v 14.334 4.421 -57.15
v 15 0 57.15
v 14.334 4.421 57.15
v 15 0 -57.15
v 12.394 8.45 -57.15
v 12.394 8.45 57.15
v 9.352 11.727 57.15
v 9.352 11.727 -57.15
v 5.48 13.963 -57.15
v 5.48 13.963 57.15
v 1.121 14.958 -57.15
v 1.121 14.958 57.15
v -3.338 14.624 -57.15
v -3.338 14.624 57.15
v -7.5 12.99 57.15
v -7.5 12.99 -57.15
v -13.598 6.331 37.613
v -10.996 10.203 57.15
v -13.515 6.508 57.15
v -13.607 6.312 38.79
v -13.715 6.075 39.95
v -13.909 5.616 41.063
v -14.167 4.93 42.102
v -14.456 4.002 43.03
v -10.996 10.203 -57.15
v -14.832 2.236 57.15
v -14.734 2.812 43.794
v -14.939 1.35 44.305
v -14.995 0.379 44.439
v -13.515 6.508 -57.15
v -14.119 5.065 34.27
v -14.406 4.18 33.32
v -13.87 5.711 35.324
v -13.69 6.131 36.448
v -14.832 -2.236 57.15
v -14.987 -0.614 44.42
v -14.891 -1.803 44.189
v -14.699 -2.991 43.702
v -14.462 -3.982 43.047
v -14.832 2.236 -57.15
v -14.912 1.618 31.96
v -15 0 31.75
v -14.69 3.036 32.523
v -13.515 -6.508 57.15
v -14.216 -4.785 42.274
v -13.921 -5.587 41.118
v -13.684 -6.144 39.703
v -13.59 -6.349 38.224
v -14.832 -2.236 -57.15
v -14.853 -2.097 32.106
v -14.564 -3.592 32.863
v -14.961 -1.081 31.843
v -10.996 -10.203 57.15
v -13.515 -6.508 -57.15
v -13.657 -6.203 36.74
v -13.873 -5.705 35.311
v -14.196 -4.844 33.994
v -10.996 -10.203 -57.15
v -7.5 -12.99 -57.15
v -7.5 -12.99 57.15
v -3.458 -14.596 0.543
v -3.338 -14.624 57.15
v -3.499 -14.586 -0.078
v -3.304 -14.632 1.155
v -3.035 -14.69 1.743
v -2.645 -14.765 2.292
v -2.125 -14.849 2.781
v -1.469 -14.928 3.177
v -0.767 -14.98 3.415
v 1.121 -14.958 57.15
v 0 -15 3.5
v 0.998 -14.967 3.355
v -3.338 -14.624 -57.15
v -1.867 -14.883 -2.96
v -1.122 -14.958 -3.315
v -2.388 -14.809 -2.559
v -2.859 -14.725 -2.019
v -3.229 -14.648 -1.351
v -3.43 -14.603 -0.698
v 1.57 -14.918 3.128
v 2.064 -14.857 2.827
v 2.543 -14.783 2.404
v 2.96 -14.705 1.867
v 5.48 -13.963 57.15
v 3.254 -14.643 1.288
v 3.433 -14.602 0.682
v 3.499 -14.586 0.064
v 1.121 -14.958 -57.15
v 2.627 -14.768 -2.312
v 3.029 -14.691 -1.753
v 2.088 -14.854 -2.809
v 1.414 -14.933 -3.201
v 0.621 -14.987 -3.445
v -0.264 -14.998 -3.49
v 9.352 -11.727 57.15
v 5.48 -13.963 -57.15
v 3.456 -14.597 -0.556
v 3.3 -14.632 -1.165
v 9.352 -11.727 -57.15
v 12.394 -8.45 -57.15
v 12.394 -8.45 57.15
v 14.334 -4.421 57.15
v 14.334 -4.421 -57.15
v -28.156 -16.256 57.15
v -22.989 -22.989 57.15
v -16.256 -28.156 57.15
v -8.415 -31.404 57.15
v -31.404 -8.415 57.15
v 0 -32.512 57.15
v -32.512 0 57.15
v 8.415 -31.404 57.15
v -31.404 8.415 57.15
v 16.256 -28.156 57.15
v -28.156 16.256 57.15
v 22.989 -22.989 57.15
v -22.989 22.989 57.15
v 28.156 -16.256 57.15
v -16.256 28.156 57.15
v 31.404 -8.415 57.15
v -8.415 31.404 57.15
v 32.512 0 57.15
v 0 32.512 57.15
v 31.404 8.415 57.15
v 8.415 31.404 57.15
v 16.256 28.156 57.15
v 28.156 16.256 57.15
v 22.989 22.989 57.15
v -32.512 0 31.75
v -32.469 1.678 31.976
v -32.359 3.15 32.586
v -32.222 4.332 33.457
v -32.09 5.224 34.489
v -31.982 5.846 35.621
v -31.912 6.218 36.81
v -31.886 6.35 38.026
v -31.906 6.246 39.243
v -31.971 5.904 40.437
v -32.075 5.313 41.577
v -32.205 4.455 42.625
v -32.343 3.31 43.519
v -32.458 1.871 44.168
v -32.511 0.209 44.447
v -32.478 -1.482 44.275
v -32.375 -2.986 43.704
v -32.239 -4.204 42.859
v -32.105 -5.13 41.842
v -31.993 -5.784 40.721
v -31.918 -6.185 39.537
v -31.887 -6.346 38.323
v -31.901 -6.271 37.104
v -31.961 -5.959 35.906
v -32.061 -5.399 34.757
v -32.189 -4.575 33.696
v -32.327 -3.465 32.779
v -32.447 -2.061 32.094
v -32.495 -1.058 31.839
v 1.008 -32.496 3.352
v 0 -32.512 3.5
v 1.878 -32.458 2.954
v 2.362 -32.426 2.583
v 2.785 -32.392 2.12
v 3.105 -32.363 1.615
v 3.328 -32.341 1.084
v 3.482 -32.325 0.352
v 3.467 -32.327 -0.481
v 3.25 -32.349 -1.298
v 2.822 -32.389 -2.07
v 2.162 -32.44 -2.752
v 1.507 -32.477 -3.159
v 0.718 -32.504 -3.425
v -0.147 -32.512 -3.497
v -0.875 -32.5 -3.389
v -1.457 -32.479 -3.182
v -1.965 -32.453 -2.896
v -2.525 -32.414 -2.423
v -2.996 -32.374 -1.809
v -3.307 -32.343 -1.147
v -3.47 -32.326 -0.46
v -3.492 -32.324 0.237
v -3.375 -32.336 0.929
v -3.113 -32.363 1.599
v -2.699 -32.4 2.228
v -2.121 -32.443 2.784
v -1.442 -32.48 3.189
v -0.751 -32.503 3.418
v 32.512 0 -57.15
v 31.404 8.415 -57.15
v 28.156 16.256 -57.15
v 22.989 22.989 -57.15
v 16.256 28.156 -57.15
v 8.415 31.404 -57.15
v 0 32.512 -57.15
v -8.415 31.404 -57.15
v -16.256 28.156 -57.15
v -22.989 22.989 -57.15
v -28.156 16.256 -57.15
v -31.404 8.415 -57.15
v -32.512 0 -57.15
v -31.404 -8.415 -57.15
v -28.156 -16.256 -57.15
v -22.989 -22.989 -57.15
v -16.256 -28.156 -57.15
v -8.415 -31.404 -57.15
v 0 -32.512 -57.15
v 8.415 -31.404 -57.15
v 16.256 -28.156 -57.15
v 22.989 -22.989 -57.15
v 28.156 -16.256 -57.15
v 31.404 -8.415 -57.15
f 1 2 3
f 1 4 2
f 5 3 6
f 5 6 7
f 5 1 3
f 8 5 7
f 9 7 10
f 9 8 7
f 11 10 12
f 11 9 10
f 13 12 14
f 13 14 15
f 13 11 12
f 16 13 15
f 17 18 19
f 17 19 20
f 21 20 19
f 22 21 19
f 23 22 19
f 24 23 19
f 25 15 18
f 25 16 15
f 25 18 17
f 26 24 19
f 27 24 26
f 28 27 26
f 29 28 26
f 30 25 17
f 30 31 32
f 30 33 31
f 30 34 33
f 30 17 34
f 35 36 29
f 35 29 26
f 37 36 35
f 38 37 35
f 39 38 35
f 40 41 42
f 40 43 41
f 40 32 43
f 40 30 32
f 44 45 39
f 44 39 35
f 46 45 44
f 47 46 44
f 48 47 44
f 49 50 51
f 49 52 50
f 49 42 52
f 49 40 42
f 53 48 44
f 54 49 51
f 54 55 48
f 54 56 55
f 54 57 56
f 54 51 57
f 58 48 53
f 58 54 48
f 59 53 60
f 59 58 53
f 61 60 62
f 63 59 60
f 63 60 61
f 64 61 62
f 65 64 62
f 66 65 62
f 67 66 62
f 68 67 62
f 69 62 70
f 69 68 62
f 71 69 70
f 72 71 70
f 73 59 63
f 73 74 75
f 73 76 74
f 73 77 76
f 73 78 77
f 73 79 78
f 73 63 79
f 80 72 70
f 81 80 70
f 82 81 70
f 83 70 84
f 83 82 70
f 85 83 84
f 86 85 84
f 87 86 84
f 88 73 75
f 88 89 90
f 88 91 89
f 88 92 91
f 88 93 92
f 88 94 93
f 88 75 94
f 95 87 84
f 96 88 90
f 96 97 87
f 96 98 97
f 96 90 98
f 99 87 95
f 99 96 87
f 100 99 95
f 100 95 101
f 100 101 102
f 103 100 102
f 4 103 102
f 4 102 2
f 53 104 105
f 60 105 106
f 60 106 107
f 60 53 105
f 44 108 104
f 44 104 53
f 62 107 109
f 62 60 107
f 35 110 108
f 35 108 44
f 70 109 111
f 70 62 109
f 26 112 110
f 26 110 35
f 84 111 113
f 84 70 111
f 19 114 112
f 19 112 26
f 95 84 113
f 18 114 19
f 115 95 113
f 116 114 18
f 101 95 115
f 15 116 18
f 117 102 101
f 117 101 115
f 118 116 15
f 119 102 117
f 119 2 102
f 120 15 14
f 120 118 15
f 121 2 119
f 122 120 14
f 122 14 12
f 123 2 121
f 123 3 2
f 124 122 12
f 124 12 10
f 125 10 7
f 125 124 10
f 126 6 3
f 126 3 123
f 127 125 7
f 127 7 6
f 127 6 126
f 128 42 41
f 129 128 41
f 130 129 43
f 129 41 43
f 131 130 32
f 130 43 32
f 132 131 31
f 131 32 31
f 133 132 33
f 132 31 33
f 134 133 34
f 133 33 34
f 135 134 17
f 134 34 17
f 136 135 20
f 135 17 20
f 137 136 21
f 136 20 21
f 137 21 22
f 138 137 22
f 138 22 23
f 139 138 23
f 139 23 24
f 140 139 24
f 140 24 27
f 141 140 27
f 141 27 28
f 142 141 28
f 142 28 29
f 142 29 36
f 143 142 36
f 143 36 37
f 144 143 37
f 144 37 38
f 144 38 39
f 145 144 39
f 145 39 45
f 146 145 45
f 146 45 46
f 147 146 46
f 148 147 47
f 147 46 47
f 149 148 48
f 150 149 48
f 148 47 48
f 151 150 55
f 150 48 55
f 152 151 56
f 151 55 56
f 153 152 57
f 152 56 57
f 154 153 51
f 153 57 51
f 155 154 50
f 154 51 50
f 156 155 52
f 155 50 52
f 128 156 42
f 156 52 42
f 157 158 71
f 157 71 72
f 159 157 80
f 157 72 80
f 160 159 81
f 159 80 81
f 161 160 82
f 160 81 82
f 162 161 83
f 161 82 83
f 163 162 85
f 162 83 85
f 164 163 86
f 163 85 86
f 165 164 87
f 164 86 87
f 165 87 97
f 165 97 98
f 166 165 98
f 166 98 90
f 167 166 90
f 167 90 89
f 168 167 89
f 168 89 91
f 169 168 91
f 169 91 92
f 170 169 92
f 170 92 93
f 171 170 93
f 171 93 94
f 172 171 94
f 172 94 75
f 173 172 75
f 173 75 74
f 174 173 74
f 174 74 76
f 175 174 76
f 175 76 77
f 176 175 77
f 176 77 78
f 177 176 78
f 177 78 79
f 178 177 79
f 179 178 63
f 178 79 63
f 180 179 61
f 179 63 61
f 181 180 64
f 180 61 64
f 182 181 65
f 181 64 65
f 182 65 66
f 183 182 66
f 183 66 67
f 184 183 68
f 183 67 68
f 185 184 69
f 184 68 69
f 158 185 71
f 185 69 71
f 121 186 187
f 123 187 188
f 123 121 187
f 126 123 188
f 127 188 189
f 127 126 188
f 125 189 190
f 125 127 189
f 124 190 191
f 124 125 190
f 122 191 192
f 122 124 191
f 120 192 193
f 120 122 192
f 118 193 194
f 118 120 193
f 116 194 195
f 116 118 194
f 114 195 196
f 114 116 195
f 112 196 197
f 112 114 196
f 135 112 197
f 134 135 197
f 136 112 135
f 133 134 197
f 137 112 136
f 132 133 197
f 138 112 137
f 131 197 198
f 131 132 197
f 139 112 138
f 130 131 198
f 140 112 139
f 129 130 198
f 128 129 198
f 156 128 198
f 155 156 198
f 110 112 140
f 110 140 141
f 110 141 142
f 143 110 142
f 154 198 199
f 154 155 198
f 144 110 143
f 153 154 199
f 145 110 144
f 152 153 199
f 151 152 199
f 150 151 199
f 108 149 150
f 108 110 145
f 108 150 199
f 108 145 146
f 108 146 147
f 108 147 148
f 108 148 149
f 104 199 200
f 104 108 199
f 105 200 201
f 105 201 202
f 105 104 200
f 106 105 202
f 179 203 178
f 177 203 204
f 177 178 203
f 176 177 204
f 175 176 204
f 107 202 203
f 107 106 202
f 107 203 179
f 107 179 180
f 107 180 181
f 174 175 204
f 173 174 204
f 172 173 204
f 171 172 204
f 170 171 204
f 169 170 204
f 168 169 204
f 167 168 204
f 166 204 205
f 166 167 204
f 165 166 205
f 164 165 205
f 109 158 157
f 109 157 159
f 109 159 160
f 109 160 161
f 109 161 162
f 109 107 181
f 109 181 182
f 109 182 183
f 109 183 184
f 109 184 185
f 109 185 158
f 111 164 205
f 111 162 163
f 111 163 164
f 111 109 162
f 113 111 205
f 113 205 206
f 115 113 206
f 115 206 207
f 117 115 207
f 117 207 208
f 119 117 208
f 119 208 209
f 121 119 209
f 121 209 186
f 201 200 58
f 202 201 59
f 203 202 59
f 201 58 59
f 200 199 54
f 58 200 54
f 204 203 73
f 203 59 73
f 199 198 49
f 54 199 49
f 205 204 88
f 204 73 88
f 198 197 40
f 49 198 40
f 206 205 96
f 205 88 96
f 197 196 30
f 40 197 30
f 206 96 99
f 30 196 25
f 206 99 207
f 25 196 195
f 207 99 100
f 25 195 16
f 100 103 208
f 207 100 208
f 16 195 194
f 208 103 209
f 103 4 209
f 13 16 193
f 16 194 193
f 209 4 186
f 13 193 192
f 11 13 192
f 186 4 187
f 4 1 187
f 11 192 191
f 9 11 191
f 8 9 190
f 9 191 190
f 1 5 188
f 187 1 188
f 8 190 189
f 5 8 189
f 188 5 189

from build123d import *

# Parameters (mm, degrees)
SKETCH2_R               = 32.512
SKETCH2_R_2             = 15
BOSS_EXTRUDE1_DEPTH     = 57.15
CUT_EXTRUDE1_REACH      = 75.35
CUT_EXTRUDE1_END_RADIUS = 32.512
SKETCH3_R               = 6.35
CUT_EXTRUDE2_REACH      = 75.35
CUT_EXTRUDE2_END_RADIUS = 32.512
SKETCH5_R               = 3.5


with BuildPart() as part:
    # Sketch2 → Boss-Extrude1 (new, symmetric)
    with BuildSketch(Plane.XY):
        Circle(SKETCH2_R)
        Circle(SKETCH2_R_2, mode=Mode.SUBTRACT)
    extrude(amount=BOSS_EXTRUDE1_DEPTH, both=True)

    # Cut-Extrude1: up to this cylinder (the profile starts inside it)
    cut_extrude1_end = Plane(origin=(0, 0, 38.1), z_dir=(0, 0, -1)) * Cylinder(CUT_EXTRUDE1_END_RADIUS, 216.724, mode=Mode.PRIVATE)
    # Sketch3 → Cut-Extrude1 (cut, up to the surface)
    with BuildSketch(Plane(origin=(0, 0, 0), x_dir=(0, 0, -1), z_dir=(1, 0, 0)), mode=Mode.PRIVATE) as cut_extrude1_sk1:
        with Locations((-38.1, 0)):
            Circle(SKETCH3_R)
    cut_extrude1_tool1 = extrude(cut_extrude1_sk1.sketch, amount=-CUT_EXTRUDE1_REACH, mode=Mode.PRIVATE) & cut_extrude1_end
    add(cut_extrude1_tool1.solids().sort_by_distance((0, 0, 38.1))[0], mode=Mode.SUBTRACT)

    # Cut-Extrude2: up to this cylinder (the profile starts inside it)
    cut_extrude2_end = Plane(origin=(0, 0, 0), z_dir=(0, 0, -1)) * Cylinder(CUT_EXTRUDE2_END_RADIUS, 216.724, mode=Mode.PRIVATE)
    # Sketch5 → Cut-Extrude2 (cut, up to the surface)
    with BuildSketch(Plane(origin=(0, 0, 0), x_dir=(1, 0, 0), z_dir=(0, 1, 0)), mode=Mode.PRIVATE) as cut_extrude2_sk1:
        with Locations(Location((0, 0, 0), (0, 0, 270))):
            Circle(SKETCH5_R)
    cut_extrude2_tool1 = extrude(cut_extrude2_sk1.sketch, amount=-CUT_EXTRUDE2_REACH, mode=Mode.PRIVATE) & cut_extrude2_end
    add(cut_extrude2_tool1.solids().sort_by_distance((0, 0, 0))[0], mode=Mode.SUBTRACT)


solid = part.part
